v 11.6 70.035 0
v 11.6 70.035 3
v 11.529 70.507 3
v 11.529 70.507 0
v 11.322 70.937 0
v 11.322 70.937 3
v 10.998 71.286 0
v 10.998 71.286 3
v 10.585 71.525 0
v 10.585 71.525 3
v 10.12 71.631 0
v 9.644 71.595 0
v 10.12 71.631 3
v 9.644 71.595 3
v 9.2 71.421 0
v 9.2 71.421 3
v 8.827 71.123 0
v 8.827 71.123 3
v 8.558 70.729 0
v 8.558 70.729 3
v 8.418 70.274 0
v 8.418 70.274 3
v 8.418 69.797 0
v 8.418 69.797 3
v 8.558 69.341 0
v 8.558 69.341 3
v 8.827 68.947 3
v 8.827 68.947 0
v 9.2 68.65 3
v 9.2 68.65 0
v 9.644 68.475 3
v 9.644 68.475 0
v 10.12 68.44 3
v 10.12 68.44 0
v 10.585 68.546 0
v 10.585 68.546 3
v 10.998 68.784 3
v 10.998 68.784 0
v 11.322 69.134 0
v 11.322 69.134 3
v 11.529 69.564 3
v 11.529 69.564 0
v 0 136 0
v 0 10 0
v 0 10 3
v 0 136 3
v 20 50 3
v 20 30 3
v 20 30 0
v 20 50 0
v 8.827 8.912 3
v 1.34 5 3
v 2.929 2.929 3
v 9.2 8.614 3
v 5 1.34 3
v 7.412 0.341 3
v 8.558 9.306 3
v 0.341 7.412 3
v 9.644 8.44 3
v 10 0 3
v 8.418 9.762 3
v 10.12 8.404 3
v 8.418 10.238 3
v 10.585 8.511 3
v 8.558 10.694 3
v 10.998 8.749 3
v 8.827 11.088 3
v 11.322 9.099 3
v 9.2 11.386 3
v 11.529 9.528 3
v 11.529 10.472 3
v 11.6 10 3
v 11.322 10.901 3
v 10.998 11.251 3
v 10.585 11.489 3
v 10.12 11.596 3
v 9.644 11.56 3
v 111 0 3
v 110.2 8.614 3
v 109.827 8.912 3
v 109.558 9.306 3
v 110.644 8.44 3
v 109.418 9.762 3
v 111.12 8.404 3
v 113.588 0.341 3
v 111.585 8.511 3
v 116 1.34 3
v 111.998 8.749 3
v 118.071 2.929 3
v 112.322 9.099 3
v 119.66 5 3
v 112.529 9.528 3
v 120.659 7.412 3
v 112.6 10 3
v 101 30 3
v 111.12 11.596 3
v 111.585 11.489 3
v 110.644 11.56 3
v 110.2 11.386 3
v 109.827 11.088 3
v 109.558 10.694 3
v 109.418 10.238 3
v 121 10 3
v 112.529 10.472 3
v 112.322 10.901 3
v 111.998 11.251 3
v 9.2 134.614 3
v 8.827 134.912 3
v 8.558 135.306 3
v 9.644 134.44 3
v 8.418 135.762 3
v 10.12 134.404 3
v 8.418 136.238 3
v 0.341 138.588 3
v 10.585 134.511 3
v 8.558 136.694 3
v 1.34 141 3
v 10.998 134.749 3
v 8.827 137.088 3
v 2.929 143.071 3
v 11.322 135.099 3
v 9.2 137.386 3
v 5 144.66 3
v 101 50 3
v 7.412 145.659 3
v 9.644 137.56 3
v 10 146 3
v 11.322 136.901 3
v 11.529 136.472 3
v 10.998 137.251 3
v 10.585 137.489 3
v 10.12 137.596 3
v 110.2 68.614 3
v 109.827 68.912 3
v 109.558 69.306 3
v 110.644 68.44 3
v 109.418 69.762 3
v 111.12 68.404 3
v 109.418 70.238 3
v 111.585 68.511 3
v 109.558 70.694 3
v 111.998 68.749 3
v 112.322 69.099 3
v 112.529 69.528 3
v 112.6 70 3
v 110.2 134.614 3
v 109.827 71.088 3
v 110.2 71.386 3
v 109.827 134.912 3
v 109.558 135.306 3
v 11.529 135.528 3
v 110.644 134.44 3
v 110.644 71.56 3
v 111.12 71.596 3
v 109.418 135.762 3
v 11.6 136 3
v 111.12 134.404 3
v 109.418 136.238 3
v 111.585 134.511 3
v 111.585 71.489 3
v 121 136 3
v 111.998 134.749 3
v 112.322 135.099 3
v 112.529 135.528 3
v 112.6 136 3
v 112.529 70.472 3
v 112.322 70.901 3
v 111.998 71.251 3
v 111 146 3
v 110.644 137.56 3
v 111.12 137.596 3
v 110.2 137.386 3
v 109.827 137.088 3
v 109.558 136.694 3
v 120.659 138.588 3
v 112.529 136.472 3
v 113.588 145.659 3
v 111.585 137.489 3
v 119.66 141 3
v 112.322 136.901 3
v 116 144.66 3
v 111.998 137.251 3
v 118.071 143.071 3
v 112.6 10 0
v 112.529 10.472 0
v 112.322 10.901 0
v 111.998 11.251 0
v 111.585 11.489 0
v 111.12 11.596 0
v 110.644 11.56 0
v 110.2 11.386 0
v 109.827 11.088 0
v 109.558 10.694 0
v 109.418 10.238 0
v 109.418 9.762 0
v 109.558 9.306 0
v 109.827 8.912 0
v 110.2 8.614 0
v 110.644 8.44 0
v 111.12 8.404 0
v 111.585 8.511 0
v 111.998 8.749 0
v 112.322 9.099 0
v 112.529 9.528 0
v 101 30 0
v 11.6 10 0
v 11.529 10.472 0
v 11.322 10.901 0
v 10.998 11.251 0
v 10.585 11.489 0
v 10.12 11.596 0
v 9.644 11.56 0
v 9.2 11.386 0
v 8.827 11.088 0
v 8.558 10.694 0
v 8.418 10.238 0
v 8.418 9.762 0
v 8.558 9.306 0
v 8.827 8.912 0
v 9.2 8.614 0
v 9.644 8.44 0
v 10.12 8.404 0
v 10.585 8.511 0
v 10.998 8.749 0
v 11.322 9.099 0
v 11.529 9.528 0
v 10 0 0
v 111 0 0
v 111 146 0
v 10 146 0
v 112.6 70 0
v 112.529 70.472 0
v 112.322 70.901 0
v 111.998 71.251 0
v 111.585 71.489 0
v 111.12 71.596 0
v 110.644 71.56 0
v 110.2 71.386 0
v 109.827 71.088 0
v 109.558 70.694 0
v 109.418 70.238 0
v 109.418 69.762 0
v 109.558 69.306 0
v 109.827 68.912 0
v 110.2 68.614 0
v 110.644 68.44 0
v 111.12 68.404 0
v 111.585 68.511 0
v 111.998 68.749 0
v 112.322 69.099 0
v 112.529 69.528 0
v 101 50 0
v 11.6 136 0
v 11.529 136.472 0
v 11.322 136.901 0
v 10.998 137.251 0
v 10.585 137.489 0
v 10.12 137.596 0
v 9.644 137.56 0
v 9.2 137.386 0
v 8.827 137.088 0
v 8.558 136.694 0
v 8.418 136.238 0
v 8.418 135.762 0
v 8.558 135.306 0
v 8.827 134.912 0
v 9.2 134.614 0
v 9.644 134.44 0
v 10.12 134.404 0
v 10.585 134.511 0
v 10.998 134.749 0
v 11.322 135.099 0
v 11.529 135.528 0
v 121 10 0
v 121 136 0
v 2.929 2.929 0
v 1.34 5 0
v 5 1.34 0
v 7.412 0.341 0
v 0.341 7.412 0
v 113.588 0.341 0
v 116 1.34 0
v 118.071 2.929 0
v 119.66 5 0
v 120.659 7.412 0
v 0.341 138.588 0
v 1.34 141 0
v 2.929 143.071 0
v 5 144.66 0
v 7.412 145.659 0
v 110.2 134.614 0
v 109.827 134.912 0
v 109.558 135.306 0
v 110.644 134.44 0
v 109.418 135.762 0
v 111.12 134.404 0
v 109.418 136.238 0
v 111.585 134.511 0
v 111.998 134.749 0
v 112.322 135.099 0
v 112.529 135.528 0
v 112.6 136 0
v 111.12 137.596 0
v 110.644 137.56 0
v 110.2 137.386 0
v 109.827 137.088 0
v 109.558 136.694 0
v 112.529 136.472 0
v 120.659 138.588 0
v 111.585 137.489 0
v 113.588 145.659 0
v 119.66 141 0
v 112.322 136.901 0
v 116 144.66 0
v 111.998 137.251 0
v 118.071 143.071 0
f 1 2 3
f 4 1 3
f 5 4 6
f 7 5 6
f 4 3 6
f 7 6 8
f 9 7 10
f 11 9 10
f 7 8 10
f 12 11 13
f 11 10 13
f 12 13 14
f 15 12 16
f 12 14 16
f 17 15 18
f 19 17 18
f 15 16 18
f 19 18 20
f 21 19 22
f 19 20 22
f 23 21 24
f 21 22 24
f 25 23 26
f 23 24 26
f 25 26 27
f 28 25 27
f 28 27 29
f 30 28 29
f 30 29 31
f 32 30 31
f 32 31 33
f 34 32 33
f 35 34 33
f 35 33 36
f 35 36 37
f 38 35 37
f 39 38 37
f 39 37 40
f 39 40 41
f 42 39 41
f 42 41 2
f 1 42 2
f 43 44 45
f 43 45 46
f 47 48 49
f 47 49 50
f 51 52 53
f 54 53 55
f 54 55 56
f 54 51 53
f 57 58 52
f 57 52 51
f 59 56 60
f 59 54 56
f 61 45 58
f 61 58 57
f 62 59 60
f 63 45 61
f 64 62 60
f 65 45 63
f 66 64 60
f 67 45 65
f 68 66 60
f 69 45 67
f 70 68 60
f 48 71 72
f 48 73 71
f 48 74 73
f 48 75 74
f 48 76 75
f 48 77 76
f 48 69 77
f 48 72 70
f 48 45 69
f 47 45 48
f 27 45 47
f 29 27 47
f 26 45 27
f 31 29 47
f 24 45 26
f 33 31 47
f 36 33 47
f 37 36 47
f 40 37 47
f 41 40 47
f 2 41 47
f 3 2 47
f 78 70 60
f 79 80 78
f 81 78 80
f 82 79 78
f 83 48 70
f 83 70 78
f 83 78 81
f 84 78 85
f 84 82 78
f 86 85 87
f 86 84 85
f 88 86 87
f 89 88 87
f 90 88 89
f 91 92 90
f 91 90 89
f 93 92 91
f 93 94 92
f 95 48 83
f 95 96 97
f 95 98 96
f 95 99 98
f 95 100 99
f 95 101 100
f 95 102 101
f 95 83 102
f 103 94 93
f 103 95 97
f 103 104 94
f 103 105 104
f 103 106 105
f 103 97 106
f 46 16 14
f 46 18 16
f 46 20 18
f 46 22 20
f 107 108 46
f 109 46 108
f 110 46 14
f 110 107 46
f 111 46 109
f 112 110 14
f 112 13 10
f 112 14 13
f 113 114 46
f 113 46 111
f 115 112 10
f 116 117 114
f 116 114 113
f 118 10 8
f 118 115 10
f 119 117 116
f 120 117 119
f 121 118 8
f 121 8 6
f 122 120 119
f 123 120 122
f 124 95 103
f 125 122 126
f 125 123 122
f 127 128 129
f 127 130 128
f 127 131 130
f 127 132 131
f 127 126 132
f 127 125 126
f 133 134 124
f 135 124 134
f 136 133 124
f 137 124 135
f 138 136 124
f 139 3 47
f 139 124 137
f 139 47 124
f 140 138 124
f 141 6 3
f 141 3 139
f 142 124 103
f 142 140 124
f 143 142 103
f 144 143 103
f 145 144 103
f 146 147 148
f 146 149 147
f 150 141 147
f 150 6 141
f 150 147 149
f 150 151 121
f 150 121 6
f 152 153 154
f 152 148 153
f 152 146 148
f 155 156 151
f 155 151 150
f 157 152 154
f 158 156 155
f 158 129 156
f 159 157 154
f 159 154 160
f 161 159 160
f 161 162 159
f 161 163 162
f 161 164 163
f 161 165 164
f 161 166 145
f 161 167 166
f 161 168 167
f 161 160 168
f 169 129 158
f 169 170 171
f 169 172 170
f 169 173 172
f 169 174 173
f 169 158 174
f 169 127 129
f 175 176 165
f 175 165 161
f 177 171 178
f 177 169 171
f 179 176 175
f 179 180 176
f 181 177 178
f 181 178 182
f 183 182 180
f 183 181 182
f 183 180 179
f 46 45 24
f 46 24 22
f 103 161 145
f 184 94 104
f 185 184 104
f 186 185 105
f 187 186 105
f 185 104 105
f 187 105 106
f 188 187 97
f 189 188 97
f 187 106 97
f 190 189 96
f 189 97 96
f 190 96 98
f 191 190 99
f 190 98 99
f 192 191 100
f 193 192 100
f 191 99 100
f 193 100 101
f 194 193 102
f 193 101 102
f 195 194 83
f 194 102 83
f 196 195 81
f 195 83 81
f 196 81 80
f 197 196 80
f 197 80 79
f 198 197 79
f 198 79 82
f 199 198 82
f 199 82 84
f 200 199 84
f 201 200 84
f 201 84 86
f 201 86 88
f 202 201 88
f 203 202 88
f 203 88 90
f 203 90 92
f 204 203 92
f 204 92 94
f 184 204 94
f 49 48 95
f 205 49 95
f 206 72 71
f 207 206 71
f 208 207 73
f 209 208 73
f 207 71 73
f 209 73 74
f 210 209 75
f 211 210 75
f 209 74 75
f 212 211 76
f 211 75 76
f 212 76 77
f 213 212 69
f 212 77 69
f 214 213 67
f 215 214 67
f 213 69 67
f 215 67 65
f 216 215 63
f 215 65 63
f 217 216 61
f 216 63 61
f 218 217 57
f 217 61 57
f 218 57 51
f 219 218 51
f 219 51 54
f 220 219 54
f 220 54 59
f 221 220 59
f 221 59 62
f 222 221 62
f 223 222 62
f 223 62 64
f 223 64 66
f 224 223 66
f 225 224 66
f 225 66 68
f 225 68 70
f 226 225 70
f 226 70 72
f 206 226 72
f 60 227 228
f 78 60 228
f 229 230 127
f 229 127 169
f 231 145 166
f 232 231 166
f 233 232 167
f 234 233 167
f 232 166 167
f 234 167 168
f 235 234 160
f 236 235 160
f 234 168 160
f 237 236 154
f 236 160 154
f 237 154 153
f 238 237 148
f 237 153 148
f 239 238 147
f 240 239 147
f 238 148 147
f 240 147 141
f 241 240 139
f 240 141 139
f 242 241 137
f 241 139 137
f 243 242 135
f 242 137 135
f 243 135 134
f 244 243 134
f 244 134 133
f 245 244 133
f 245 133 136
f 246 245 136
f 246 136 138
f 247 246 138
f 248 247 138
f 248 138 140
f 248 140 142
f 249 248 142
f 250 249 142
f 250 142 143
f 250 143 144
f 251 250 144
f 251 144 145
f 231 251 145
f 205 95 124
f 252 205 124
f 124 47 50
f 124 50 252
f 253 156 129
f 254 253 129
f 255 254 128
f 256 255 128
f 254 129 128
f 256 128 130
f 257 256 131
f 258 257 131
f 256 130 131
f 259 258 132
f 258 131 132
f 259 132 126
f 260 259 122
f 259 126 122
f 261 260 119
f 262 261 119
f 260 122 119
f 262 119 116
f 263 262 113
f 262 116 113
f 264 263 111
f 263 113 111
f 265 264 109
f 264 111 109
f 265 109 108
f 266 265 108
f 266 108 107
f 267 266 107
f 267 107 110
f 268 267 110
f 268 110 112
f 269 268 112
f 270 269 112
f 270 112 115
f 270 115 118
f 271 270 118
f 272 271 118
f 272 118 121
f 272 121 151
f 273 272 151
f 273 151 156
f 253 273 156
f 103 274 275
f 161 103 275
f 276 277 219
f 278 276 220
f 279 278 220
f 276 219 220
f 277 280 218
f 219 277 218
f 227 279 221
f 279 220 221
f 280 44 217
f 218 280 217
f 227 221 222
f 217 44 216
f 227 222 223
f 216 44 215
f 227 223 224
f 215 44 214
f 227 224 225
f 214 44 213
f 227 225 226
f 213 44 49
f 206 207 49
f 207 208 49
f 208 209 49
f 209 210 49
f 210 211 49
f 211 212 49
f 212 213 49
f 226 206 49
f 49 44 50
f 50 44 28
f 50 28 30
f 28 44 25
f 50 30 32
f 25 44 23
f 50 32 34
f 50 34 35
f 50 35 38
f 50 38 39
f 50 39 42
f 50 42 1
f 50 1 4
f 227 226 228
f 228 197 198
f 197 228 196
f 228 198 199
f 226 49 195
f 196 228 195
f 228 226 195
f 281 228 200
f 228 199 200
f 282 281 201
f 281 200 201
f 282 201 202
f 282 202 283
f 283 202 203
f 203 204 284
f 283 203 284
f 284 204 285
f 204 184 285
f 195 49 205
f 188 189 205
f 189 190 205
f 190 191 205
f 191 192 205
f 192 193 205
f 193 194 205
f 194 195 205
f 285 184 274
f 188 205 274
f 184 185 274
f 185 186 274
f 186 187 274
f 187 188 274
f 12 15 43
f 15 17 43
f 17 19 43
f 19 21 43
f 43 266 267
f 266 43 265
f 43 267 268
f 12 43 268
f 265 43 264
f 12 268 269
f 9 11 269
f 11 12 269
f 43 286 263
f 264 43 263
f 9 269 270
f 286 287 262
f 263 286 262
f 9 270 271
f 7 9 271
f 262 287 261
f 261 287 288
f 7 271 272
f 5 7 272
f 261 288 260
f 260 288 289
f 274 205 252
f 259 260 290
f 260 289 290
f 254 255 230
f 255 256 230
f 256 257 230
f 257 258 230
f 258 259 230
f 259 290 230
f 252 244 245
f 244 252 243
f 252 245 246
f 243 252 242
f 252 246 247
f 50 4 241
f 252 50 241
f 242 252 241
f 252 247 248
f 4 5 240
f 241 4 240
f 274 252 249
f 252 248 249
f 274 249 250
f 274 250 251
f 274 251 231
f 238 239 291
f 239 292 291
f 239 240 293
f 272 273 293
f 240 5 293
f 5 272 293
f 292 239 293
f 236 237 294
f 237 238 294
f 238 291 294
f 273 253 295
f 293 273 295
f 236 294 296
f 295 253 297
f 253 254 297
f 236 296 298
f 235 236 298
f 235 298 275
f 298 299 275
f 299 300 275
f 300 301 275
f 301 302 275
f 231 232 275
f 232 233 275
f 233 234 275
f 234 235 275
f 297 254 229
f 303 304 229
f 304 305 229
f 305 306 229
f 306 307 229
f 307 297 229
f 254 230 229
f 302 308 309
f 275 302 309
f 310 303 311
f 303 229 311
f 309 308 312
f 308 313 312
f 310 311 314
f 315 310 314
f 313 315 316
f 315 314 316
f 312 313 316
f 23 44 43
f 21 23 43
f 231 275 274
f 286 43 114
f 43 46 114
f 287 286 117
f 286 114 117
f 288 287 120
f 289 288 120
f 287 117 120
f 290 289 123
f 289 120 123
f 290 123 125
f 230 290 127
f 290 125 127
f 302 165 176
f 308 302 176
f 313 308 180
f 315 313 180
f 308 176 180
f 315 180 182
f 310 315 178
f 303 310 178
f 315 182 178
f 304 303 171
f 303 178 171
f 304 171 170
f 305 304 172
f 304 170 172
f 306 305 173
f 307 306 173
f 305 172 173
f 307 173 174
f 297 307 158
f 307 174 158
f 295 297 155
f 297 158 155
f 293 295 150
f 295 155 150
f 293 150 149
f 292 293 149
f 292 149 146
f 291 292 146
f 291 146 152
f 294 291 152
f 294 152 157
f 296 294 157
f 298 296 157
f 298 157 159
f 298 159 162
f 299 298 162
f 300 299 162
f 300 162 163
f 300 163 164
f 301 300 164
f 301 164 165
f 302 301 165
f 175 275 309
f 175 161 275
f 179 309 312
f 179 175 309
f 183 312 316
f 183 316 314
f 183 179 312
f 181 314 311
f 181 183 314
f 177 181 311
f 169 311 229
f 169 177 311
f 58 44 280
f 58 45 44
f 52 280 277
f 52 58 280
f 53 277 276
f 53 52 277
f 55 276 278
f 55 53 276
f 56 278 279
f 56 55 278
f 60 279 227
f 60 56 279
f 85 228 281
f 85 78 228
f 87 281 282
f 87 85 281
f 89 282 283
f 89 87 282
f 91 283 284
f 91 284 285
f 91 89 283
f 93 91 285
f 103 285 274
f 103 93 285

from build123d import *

# Parameters (mm, degrees)
SKETCH_1_W          = 121
SKETCH_1_H          = 146
EXTRUDE_1_DEPTH     = 3
FILLET_1_R          = 10
SKETCH_2_R          = 1.6
CUT_EXTRUDE_1_DEPTH = 4
SKETCH_3_W          = 81
SKETCH_3_H          = 20
CUT_EXTRUDE_2_DEPTH = 4


with BuildPart() as part:
    # Sketch 1 → ﾎﾞｽ - 押し出し1 (new body)
    with BuildSketch(Plane.XY):
        with Locations((60.5, 73)):
            Rectangle(SKETCH_1_W, SKETCH_1_H)
    extrude(amount=EXTRUDE_1_DEPTH)

    # ﾌｨﾚｯﾄ1
    fillet_1_edges = [part.edges().sort_by_distance(p)[0] for p in [
        (0, 146, 1.5),
        (121, 146, 1.5),
        (121, 0, 1.5),
        (0, 0, 1.5),
    ]]
    fillet(fillet_1_edges, radius=FILLET_1_R)

    # ｽｹｯﾁ2 → ｶｯﾄ - 押し出し1 (cut, through all)
    with BuildSketch(Plane.XY.offset(3)):
        with Locations((10, 136)):
            Circle(SKETCH_2_R)
        with Locations((10, 70.035204196)):
            Circle(SKETCH_2_R)
        with Locations((111, 136)):
            Circle(SKETCH_2_R)
        with Locations((111, 70)):
            Circle(SKETCH_2_R)
        with Locations((111, 10)):
            Circle(SKETCH_2_R)
        with Locations((10, 10)):
            Circle(SKETCH_2_R)
    extrude(amount=-CUT_EXTRUDE_1_DEPTH, mode=Mode.SUBTRACT)

    # ｽｹｯﾁ3 → ｶｯﾄ - 押し出し2 (cut, through all)
    with BuildSketch(Plane.XY.offset(3)):
        with Locations((60.5, 40)):
            Rectangle(SKETCH_3_W, SKETCH_3_H)
    extrude(amount=-CUT_EXTRUDE_2_DEPTH, mode=Mode.SUBTRACT)


solid = part.part
